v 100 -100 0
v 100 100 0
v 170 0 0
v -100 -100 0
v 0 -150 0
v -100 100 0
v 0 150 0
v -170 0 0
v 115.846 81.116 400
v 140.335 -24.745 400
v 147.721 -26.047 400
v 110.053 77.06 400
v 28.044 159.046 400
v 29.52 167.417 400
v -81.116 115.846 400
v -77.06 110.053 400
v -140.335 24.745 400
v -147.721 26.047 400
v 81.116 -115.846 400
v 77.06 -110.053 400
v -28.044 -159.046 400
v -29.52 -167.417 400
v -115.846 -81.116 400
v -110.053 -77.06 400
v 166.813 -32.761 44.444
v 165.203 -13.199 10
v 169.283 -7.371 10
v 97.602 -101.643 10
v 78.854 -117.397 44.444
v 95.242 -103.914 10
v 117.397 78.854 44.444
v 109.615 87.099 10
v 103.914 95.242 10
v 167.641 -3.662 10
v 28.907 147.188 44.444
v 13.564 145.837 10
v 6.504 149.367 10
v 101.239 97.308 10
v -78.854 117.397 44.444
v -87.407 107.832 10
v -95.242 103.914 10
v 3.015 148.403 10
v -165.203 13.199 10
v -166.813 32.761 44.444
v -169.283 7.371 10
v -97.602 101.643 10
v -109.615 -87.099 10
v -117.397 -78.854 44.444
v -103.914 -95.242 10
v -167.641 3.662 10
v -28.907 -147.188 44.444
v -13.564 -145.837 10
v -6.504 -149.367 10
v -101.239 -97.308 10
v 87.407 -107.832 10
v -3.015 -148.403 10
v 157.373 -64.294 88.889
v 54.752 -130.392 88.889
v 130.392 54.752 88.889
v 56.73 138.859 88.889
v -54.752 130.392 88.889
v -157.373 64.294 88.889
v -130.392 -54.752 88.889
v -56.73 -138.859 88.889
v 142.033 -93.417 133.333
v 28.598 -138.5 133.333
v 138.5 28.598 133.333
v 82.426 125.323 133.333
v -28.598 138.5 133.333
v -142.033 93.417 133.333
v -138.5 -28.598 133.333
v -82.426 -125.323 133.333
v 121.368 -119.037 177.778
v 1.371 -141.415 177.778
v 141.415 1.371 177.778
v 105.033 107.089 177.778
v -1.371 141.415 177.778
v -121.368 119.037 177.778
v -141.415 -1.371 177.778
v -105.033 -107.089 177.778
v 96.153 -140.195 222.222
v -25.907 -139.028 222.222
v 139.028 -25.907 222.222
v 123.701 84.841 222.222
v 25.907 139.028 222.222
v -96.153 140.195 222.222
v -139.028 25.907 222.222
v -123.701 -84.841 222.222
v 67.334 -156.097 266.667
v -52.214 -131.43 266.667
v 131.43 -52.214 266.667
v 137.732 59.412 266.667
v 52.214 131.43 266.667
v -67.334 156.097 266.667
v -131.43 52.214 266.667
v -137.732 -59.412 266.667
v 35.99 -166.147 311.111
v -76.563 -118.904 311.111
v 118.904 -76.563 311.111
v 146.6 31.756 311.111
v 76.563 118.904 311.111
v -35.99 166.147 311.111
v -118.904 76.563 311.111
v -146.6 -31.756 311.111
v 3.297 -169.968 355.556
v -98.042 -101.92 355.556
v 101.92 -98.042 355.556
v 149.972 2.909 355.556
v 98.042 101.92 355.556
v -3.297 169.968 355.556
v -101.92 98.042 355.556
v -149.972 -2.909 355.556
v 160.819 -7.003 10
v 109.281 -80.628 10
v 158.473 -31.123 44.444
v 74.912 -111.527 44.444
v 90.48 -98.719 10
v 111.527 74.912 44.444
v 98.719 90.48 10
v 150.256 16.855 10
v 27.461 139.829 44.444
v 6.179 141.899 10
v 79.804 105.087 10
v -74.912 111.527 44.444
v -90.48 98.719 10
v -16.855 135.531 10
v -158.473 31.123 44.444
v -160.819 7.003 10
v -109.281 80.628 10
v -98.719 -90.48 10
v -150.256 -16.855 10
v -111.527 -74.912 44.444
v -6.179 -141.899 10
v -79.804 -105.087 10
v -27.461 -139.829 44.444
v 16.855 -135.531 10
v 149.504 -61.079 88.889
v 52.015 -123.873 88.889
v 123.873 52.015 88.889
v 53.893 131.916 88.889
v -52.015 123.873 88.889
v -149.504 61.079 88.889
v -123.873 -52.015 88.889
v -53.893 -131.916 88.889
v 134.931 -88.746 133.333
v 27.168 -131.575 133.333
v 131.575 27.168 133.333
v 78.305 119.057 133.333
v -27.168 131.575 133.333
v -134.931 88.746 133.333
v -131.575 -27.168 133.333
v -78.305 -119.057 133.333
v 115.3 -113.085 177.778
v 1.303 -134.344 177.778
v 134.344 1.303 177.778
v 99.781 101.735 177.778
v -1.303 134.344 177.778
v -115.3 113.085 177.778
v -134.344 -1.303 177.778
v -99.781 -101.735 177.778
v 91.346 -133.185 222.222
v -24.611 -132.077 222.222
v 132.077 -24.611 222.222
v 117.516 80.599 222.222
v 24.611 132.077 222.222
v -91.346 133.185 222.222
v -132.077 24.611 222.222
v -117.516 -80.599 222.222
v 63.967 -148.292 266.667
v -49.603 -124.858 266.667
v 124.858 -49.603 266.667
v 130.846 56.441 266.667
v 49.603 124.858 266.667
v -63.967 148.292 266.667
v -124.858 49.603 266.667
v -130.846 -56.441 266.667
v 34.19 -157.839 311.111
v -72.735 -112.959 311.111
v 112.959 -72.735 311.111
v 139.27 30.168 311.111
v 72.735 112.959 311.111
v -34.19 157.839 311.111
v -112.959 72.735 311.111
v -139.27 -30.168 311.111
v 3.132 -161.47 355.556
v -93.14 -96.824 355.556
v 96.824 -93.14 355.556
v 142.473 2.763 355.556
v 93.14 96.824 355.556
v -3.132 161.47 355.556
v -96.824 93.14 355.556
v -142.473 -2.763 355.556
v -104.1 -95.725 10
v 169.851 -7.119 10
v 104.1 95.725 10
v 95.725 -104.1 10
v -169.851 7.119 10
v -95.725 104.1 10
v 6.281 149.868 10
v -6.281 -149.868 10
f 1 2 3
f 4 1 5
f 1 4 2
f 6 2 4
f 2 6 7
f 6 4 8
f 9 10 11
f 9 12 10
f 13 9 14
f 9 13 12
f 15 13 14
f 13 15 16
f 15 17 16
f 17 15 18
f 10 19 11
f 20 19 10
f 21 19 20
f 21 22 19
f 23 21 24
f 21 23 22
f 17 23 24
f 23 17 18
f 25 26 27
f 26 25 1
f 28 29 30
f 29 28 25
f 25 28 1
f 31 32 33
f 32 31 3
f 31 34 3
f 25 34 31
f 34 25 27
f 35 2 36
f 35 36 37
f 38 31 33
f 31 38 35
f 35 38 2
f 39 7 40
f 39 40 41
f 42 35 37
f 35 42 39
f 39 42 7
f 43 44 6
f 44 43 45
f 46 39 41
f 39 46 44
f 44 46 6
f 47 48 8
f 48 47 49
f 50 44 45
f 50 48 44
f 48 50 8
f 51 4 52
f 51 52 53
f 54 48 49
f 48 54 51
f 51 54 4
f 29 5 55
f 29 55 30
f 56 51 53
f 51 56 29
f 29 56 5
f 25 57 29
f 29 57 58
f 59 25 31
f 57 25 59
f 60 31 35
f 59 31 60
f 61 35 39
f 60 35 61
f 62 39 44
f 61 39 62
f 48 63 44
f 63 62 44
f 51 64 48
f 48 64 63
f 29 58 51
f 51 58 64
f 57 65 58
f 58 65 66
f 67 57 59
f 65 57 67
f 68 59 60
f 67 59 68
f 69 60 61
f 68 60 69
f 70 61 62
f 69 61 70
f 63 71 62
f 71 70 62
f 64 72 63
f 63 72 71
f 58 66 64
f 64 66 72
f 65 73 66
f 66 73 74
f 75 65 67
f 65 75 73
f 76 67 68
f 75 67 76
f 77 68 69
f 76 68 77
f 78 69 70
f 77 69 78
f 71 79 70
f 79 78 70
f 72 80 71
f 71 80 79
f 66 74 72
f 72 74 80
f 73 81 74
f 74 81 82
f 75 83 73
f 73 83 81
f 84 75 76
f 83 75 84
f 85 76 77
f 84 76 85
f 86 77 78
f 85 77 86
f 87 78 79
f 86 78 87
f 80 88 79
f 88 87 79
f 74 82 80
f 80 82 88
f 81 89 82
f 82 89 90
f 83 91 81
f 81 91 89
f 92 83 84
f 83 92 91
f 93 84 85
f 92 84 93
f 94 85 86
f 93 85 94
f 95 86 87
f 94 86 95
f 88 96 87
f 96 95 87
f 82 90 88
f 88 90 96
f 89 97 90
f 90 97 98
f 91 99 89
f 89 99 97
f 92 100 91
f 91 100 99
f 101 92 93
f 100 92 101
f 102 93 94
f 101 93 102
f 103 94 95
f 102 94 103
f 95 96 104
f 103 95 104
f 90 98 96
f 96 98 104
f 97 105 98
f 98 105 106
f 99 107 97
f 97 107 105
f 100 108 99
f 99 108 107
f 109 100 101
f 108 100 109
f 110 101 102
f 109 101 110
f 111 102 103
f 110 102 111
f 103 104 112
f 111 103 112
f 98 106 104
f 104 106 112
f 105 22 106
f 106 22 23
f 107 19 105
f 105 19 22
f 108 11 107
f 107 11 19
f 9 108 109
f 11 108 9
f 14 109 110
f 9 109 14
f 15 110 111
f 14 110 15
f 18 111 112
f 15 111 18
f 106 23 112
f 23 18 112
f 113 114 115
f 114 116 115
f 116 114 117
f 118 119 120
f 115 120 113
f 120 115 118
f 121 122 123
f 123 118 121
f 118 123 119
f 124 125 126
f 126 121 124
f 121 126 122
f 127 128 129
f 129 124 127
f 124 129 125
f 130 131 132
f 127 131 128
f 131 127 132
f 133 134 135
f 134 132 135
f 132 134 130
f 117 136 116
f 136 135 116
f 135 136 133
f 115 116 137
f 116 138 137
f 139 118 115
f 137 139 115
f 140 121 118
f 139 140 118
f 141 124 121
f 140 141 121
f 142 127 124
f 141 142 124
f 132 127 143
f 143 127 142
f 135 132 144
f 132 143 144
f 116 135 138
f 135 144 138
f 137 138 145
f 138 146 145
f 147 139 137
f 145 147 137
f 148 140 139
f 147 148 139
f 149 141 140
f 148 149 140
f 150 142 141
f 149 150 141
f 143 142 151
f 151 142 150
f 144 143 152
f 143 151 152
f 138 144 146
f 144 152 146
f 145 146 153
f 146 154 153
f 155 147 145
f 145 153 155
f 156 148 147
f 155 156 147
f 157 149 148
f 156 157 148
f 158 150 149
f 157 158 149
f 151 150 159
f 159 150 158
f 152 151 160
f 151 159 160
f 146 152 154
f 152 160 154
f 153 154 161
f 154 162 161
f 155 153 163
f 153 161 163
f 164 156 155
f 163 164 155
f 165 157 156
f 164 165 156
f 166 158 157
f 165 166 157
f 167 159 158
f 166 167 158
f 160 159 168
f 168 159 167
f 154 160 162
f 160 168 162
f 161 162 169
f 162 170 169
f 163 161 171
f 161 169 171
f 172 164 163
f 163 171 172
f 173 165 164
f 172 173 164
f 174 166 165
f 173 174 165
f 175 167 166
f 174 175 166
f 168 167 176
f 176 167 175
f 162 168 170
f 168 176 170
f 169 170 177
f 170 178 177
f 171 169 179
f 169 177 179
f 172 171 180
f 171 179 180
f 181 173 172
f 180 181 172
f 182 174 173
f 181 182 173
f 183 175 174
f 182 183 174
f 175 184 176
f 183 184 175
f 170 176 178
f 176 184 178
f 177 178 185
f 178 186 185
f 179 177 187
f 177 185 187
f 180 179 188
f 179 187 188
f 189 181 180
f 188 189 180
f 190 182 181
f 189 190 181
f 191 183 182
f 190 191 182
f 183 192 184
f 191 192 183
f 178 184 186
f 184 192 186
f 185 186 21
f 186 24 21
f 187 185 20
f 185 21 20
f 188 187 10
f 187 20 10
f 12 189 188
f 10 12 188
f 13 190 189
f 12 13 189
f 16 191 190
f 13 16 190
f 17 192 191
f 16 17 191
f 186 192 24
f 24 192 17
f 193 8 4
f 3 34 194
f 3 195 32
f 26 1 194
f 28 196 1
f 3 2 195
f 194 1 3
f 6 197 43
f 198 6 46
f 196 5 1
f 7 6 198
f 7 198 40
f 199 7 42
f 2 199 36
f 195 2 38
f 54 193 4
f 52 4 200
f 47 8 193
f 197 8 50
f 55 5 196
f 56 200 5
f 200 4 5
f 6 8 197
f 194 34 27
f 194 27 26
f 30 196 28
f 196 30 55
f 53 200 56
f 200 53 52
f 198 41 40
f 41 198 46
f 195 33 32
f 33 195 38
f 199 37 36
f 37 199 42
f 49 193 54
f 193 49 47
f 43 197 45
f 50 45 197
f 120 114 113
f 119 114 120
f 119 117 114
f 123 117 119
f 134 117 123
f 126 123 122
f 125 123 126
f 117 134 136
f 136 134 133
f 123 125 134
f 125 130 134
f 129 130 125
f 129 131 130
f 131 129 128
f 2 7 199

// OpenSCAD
linear_extrude(height = 10, convexity = 10,twist=2.4) polygon(points=[[-100,-100],[-170,0],[-100,100],[0,150],[100,100],[170,0],[100,-100],[0,-150]]);

difference() {
linear_extrude(height = 400, convexity = 10,twist=100) polygon(points=[[-100,-100],[-170,0],[-100,100],[0,150],[100,100],[170,0],[100,-100],[0,-150]]);

translate([0,0,0]) scale([0.95,0.95,1])linear_extrude(height = 400, convexity = 10,twist=100) polygon(points=[[-100,-100],[-170,0],[-100,100],[0,150],[100,100],[170,0],[100,-100],[0,-150]]);
}
